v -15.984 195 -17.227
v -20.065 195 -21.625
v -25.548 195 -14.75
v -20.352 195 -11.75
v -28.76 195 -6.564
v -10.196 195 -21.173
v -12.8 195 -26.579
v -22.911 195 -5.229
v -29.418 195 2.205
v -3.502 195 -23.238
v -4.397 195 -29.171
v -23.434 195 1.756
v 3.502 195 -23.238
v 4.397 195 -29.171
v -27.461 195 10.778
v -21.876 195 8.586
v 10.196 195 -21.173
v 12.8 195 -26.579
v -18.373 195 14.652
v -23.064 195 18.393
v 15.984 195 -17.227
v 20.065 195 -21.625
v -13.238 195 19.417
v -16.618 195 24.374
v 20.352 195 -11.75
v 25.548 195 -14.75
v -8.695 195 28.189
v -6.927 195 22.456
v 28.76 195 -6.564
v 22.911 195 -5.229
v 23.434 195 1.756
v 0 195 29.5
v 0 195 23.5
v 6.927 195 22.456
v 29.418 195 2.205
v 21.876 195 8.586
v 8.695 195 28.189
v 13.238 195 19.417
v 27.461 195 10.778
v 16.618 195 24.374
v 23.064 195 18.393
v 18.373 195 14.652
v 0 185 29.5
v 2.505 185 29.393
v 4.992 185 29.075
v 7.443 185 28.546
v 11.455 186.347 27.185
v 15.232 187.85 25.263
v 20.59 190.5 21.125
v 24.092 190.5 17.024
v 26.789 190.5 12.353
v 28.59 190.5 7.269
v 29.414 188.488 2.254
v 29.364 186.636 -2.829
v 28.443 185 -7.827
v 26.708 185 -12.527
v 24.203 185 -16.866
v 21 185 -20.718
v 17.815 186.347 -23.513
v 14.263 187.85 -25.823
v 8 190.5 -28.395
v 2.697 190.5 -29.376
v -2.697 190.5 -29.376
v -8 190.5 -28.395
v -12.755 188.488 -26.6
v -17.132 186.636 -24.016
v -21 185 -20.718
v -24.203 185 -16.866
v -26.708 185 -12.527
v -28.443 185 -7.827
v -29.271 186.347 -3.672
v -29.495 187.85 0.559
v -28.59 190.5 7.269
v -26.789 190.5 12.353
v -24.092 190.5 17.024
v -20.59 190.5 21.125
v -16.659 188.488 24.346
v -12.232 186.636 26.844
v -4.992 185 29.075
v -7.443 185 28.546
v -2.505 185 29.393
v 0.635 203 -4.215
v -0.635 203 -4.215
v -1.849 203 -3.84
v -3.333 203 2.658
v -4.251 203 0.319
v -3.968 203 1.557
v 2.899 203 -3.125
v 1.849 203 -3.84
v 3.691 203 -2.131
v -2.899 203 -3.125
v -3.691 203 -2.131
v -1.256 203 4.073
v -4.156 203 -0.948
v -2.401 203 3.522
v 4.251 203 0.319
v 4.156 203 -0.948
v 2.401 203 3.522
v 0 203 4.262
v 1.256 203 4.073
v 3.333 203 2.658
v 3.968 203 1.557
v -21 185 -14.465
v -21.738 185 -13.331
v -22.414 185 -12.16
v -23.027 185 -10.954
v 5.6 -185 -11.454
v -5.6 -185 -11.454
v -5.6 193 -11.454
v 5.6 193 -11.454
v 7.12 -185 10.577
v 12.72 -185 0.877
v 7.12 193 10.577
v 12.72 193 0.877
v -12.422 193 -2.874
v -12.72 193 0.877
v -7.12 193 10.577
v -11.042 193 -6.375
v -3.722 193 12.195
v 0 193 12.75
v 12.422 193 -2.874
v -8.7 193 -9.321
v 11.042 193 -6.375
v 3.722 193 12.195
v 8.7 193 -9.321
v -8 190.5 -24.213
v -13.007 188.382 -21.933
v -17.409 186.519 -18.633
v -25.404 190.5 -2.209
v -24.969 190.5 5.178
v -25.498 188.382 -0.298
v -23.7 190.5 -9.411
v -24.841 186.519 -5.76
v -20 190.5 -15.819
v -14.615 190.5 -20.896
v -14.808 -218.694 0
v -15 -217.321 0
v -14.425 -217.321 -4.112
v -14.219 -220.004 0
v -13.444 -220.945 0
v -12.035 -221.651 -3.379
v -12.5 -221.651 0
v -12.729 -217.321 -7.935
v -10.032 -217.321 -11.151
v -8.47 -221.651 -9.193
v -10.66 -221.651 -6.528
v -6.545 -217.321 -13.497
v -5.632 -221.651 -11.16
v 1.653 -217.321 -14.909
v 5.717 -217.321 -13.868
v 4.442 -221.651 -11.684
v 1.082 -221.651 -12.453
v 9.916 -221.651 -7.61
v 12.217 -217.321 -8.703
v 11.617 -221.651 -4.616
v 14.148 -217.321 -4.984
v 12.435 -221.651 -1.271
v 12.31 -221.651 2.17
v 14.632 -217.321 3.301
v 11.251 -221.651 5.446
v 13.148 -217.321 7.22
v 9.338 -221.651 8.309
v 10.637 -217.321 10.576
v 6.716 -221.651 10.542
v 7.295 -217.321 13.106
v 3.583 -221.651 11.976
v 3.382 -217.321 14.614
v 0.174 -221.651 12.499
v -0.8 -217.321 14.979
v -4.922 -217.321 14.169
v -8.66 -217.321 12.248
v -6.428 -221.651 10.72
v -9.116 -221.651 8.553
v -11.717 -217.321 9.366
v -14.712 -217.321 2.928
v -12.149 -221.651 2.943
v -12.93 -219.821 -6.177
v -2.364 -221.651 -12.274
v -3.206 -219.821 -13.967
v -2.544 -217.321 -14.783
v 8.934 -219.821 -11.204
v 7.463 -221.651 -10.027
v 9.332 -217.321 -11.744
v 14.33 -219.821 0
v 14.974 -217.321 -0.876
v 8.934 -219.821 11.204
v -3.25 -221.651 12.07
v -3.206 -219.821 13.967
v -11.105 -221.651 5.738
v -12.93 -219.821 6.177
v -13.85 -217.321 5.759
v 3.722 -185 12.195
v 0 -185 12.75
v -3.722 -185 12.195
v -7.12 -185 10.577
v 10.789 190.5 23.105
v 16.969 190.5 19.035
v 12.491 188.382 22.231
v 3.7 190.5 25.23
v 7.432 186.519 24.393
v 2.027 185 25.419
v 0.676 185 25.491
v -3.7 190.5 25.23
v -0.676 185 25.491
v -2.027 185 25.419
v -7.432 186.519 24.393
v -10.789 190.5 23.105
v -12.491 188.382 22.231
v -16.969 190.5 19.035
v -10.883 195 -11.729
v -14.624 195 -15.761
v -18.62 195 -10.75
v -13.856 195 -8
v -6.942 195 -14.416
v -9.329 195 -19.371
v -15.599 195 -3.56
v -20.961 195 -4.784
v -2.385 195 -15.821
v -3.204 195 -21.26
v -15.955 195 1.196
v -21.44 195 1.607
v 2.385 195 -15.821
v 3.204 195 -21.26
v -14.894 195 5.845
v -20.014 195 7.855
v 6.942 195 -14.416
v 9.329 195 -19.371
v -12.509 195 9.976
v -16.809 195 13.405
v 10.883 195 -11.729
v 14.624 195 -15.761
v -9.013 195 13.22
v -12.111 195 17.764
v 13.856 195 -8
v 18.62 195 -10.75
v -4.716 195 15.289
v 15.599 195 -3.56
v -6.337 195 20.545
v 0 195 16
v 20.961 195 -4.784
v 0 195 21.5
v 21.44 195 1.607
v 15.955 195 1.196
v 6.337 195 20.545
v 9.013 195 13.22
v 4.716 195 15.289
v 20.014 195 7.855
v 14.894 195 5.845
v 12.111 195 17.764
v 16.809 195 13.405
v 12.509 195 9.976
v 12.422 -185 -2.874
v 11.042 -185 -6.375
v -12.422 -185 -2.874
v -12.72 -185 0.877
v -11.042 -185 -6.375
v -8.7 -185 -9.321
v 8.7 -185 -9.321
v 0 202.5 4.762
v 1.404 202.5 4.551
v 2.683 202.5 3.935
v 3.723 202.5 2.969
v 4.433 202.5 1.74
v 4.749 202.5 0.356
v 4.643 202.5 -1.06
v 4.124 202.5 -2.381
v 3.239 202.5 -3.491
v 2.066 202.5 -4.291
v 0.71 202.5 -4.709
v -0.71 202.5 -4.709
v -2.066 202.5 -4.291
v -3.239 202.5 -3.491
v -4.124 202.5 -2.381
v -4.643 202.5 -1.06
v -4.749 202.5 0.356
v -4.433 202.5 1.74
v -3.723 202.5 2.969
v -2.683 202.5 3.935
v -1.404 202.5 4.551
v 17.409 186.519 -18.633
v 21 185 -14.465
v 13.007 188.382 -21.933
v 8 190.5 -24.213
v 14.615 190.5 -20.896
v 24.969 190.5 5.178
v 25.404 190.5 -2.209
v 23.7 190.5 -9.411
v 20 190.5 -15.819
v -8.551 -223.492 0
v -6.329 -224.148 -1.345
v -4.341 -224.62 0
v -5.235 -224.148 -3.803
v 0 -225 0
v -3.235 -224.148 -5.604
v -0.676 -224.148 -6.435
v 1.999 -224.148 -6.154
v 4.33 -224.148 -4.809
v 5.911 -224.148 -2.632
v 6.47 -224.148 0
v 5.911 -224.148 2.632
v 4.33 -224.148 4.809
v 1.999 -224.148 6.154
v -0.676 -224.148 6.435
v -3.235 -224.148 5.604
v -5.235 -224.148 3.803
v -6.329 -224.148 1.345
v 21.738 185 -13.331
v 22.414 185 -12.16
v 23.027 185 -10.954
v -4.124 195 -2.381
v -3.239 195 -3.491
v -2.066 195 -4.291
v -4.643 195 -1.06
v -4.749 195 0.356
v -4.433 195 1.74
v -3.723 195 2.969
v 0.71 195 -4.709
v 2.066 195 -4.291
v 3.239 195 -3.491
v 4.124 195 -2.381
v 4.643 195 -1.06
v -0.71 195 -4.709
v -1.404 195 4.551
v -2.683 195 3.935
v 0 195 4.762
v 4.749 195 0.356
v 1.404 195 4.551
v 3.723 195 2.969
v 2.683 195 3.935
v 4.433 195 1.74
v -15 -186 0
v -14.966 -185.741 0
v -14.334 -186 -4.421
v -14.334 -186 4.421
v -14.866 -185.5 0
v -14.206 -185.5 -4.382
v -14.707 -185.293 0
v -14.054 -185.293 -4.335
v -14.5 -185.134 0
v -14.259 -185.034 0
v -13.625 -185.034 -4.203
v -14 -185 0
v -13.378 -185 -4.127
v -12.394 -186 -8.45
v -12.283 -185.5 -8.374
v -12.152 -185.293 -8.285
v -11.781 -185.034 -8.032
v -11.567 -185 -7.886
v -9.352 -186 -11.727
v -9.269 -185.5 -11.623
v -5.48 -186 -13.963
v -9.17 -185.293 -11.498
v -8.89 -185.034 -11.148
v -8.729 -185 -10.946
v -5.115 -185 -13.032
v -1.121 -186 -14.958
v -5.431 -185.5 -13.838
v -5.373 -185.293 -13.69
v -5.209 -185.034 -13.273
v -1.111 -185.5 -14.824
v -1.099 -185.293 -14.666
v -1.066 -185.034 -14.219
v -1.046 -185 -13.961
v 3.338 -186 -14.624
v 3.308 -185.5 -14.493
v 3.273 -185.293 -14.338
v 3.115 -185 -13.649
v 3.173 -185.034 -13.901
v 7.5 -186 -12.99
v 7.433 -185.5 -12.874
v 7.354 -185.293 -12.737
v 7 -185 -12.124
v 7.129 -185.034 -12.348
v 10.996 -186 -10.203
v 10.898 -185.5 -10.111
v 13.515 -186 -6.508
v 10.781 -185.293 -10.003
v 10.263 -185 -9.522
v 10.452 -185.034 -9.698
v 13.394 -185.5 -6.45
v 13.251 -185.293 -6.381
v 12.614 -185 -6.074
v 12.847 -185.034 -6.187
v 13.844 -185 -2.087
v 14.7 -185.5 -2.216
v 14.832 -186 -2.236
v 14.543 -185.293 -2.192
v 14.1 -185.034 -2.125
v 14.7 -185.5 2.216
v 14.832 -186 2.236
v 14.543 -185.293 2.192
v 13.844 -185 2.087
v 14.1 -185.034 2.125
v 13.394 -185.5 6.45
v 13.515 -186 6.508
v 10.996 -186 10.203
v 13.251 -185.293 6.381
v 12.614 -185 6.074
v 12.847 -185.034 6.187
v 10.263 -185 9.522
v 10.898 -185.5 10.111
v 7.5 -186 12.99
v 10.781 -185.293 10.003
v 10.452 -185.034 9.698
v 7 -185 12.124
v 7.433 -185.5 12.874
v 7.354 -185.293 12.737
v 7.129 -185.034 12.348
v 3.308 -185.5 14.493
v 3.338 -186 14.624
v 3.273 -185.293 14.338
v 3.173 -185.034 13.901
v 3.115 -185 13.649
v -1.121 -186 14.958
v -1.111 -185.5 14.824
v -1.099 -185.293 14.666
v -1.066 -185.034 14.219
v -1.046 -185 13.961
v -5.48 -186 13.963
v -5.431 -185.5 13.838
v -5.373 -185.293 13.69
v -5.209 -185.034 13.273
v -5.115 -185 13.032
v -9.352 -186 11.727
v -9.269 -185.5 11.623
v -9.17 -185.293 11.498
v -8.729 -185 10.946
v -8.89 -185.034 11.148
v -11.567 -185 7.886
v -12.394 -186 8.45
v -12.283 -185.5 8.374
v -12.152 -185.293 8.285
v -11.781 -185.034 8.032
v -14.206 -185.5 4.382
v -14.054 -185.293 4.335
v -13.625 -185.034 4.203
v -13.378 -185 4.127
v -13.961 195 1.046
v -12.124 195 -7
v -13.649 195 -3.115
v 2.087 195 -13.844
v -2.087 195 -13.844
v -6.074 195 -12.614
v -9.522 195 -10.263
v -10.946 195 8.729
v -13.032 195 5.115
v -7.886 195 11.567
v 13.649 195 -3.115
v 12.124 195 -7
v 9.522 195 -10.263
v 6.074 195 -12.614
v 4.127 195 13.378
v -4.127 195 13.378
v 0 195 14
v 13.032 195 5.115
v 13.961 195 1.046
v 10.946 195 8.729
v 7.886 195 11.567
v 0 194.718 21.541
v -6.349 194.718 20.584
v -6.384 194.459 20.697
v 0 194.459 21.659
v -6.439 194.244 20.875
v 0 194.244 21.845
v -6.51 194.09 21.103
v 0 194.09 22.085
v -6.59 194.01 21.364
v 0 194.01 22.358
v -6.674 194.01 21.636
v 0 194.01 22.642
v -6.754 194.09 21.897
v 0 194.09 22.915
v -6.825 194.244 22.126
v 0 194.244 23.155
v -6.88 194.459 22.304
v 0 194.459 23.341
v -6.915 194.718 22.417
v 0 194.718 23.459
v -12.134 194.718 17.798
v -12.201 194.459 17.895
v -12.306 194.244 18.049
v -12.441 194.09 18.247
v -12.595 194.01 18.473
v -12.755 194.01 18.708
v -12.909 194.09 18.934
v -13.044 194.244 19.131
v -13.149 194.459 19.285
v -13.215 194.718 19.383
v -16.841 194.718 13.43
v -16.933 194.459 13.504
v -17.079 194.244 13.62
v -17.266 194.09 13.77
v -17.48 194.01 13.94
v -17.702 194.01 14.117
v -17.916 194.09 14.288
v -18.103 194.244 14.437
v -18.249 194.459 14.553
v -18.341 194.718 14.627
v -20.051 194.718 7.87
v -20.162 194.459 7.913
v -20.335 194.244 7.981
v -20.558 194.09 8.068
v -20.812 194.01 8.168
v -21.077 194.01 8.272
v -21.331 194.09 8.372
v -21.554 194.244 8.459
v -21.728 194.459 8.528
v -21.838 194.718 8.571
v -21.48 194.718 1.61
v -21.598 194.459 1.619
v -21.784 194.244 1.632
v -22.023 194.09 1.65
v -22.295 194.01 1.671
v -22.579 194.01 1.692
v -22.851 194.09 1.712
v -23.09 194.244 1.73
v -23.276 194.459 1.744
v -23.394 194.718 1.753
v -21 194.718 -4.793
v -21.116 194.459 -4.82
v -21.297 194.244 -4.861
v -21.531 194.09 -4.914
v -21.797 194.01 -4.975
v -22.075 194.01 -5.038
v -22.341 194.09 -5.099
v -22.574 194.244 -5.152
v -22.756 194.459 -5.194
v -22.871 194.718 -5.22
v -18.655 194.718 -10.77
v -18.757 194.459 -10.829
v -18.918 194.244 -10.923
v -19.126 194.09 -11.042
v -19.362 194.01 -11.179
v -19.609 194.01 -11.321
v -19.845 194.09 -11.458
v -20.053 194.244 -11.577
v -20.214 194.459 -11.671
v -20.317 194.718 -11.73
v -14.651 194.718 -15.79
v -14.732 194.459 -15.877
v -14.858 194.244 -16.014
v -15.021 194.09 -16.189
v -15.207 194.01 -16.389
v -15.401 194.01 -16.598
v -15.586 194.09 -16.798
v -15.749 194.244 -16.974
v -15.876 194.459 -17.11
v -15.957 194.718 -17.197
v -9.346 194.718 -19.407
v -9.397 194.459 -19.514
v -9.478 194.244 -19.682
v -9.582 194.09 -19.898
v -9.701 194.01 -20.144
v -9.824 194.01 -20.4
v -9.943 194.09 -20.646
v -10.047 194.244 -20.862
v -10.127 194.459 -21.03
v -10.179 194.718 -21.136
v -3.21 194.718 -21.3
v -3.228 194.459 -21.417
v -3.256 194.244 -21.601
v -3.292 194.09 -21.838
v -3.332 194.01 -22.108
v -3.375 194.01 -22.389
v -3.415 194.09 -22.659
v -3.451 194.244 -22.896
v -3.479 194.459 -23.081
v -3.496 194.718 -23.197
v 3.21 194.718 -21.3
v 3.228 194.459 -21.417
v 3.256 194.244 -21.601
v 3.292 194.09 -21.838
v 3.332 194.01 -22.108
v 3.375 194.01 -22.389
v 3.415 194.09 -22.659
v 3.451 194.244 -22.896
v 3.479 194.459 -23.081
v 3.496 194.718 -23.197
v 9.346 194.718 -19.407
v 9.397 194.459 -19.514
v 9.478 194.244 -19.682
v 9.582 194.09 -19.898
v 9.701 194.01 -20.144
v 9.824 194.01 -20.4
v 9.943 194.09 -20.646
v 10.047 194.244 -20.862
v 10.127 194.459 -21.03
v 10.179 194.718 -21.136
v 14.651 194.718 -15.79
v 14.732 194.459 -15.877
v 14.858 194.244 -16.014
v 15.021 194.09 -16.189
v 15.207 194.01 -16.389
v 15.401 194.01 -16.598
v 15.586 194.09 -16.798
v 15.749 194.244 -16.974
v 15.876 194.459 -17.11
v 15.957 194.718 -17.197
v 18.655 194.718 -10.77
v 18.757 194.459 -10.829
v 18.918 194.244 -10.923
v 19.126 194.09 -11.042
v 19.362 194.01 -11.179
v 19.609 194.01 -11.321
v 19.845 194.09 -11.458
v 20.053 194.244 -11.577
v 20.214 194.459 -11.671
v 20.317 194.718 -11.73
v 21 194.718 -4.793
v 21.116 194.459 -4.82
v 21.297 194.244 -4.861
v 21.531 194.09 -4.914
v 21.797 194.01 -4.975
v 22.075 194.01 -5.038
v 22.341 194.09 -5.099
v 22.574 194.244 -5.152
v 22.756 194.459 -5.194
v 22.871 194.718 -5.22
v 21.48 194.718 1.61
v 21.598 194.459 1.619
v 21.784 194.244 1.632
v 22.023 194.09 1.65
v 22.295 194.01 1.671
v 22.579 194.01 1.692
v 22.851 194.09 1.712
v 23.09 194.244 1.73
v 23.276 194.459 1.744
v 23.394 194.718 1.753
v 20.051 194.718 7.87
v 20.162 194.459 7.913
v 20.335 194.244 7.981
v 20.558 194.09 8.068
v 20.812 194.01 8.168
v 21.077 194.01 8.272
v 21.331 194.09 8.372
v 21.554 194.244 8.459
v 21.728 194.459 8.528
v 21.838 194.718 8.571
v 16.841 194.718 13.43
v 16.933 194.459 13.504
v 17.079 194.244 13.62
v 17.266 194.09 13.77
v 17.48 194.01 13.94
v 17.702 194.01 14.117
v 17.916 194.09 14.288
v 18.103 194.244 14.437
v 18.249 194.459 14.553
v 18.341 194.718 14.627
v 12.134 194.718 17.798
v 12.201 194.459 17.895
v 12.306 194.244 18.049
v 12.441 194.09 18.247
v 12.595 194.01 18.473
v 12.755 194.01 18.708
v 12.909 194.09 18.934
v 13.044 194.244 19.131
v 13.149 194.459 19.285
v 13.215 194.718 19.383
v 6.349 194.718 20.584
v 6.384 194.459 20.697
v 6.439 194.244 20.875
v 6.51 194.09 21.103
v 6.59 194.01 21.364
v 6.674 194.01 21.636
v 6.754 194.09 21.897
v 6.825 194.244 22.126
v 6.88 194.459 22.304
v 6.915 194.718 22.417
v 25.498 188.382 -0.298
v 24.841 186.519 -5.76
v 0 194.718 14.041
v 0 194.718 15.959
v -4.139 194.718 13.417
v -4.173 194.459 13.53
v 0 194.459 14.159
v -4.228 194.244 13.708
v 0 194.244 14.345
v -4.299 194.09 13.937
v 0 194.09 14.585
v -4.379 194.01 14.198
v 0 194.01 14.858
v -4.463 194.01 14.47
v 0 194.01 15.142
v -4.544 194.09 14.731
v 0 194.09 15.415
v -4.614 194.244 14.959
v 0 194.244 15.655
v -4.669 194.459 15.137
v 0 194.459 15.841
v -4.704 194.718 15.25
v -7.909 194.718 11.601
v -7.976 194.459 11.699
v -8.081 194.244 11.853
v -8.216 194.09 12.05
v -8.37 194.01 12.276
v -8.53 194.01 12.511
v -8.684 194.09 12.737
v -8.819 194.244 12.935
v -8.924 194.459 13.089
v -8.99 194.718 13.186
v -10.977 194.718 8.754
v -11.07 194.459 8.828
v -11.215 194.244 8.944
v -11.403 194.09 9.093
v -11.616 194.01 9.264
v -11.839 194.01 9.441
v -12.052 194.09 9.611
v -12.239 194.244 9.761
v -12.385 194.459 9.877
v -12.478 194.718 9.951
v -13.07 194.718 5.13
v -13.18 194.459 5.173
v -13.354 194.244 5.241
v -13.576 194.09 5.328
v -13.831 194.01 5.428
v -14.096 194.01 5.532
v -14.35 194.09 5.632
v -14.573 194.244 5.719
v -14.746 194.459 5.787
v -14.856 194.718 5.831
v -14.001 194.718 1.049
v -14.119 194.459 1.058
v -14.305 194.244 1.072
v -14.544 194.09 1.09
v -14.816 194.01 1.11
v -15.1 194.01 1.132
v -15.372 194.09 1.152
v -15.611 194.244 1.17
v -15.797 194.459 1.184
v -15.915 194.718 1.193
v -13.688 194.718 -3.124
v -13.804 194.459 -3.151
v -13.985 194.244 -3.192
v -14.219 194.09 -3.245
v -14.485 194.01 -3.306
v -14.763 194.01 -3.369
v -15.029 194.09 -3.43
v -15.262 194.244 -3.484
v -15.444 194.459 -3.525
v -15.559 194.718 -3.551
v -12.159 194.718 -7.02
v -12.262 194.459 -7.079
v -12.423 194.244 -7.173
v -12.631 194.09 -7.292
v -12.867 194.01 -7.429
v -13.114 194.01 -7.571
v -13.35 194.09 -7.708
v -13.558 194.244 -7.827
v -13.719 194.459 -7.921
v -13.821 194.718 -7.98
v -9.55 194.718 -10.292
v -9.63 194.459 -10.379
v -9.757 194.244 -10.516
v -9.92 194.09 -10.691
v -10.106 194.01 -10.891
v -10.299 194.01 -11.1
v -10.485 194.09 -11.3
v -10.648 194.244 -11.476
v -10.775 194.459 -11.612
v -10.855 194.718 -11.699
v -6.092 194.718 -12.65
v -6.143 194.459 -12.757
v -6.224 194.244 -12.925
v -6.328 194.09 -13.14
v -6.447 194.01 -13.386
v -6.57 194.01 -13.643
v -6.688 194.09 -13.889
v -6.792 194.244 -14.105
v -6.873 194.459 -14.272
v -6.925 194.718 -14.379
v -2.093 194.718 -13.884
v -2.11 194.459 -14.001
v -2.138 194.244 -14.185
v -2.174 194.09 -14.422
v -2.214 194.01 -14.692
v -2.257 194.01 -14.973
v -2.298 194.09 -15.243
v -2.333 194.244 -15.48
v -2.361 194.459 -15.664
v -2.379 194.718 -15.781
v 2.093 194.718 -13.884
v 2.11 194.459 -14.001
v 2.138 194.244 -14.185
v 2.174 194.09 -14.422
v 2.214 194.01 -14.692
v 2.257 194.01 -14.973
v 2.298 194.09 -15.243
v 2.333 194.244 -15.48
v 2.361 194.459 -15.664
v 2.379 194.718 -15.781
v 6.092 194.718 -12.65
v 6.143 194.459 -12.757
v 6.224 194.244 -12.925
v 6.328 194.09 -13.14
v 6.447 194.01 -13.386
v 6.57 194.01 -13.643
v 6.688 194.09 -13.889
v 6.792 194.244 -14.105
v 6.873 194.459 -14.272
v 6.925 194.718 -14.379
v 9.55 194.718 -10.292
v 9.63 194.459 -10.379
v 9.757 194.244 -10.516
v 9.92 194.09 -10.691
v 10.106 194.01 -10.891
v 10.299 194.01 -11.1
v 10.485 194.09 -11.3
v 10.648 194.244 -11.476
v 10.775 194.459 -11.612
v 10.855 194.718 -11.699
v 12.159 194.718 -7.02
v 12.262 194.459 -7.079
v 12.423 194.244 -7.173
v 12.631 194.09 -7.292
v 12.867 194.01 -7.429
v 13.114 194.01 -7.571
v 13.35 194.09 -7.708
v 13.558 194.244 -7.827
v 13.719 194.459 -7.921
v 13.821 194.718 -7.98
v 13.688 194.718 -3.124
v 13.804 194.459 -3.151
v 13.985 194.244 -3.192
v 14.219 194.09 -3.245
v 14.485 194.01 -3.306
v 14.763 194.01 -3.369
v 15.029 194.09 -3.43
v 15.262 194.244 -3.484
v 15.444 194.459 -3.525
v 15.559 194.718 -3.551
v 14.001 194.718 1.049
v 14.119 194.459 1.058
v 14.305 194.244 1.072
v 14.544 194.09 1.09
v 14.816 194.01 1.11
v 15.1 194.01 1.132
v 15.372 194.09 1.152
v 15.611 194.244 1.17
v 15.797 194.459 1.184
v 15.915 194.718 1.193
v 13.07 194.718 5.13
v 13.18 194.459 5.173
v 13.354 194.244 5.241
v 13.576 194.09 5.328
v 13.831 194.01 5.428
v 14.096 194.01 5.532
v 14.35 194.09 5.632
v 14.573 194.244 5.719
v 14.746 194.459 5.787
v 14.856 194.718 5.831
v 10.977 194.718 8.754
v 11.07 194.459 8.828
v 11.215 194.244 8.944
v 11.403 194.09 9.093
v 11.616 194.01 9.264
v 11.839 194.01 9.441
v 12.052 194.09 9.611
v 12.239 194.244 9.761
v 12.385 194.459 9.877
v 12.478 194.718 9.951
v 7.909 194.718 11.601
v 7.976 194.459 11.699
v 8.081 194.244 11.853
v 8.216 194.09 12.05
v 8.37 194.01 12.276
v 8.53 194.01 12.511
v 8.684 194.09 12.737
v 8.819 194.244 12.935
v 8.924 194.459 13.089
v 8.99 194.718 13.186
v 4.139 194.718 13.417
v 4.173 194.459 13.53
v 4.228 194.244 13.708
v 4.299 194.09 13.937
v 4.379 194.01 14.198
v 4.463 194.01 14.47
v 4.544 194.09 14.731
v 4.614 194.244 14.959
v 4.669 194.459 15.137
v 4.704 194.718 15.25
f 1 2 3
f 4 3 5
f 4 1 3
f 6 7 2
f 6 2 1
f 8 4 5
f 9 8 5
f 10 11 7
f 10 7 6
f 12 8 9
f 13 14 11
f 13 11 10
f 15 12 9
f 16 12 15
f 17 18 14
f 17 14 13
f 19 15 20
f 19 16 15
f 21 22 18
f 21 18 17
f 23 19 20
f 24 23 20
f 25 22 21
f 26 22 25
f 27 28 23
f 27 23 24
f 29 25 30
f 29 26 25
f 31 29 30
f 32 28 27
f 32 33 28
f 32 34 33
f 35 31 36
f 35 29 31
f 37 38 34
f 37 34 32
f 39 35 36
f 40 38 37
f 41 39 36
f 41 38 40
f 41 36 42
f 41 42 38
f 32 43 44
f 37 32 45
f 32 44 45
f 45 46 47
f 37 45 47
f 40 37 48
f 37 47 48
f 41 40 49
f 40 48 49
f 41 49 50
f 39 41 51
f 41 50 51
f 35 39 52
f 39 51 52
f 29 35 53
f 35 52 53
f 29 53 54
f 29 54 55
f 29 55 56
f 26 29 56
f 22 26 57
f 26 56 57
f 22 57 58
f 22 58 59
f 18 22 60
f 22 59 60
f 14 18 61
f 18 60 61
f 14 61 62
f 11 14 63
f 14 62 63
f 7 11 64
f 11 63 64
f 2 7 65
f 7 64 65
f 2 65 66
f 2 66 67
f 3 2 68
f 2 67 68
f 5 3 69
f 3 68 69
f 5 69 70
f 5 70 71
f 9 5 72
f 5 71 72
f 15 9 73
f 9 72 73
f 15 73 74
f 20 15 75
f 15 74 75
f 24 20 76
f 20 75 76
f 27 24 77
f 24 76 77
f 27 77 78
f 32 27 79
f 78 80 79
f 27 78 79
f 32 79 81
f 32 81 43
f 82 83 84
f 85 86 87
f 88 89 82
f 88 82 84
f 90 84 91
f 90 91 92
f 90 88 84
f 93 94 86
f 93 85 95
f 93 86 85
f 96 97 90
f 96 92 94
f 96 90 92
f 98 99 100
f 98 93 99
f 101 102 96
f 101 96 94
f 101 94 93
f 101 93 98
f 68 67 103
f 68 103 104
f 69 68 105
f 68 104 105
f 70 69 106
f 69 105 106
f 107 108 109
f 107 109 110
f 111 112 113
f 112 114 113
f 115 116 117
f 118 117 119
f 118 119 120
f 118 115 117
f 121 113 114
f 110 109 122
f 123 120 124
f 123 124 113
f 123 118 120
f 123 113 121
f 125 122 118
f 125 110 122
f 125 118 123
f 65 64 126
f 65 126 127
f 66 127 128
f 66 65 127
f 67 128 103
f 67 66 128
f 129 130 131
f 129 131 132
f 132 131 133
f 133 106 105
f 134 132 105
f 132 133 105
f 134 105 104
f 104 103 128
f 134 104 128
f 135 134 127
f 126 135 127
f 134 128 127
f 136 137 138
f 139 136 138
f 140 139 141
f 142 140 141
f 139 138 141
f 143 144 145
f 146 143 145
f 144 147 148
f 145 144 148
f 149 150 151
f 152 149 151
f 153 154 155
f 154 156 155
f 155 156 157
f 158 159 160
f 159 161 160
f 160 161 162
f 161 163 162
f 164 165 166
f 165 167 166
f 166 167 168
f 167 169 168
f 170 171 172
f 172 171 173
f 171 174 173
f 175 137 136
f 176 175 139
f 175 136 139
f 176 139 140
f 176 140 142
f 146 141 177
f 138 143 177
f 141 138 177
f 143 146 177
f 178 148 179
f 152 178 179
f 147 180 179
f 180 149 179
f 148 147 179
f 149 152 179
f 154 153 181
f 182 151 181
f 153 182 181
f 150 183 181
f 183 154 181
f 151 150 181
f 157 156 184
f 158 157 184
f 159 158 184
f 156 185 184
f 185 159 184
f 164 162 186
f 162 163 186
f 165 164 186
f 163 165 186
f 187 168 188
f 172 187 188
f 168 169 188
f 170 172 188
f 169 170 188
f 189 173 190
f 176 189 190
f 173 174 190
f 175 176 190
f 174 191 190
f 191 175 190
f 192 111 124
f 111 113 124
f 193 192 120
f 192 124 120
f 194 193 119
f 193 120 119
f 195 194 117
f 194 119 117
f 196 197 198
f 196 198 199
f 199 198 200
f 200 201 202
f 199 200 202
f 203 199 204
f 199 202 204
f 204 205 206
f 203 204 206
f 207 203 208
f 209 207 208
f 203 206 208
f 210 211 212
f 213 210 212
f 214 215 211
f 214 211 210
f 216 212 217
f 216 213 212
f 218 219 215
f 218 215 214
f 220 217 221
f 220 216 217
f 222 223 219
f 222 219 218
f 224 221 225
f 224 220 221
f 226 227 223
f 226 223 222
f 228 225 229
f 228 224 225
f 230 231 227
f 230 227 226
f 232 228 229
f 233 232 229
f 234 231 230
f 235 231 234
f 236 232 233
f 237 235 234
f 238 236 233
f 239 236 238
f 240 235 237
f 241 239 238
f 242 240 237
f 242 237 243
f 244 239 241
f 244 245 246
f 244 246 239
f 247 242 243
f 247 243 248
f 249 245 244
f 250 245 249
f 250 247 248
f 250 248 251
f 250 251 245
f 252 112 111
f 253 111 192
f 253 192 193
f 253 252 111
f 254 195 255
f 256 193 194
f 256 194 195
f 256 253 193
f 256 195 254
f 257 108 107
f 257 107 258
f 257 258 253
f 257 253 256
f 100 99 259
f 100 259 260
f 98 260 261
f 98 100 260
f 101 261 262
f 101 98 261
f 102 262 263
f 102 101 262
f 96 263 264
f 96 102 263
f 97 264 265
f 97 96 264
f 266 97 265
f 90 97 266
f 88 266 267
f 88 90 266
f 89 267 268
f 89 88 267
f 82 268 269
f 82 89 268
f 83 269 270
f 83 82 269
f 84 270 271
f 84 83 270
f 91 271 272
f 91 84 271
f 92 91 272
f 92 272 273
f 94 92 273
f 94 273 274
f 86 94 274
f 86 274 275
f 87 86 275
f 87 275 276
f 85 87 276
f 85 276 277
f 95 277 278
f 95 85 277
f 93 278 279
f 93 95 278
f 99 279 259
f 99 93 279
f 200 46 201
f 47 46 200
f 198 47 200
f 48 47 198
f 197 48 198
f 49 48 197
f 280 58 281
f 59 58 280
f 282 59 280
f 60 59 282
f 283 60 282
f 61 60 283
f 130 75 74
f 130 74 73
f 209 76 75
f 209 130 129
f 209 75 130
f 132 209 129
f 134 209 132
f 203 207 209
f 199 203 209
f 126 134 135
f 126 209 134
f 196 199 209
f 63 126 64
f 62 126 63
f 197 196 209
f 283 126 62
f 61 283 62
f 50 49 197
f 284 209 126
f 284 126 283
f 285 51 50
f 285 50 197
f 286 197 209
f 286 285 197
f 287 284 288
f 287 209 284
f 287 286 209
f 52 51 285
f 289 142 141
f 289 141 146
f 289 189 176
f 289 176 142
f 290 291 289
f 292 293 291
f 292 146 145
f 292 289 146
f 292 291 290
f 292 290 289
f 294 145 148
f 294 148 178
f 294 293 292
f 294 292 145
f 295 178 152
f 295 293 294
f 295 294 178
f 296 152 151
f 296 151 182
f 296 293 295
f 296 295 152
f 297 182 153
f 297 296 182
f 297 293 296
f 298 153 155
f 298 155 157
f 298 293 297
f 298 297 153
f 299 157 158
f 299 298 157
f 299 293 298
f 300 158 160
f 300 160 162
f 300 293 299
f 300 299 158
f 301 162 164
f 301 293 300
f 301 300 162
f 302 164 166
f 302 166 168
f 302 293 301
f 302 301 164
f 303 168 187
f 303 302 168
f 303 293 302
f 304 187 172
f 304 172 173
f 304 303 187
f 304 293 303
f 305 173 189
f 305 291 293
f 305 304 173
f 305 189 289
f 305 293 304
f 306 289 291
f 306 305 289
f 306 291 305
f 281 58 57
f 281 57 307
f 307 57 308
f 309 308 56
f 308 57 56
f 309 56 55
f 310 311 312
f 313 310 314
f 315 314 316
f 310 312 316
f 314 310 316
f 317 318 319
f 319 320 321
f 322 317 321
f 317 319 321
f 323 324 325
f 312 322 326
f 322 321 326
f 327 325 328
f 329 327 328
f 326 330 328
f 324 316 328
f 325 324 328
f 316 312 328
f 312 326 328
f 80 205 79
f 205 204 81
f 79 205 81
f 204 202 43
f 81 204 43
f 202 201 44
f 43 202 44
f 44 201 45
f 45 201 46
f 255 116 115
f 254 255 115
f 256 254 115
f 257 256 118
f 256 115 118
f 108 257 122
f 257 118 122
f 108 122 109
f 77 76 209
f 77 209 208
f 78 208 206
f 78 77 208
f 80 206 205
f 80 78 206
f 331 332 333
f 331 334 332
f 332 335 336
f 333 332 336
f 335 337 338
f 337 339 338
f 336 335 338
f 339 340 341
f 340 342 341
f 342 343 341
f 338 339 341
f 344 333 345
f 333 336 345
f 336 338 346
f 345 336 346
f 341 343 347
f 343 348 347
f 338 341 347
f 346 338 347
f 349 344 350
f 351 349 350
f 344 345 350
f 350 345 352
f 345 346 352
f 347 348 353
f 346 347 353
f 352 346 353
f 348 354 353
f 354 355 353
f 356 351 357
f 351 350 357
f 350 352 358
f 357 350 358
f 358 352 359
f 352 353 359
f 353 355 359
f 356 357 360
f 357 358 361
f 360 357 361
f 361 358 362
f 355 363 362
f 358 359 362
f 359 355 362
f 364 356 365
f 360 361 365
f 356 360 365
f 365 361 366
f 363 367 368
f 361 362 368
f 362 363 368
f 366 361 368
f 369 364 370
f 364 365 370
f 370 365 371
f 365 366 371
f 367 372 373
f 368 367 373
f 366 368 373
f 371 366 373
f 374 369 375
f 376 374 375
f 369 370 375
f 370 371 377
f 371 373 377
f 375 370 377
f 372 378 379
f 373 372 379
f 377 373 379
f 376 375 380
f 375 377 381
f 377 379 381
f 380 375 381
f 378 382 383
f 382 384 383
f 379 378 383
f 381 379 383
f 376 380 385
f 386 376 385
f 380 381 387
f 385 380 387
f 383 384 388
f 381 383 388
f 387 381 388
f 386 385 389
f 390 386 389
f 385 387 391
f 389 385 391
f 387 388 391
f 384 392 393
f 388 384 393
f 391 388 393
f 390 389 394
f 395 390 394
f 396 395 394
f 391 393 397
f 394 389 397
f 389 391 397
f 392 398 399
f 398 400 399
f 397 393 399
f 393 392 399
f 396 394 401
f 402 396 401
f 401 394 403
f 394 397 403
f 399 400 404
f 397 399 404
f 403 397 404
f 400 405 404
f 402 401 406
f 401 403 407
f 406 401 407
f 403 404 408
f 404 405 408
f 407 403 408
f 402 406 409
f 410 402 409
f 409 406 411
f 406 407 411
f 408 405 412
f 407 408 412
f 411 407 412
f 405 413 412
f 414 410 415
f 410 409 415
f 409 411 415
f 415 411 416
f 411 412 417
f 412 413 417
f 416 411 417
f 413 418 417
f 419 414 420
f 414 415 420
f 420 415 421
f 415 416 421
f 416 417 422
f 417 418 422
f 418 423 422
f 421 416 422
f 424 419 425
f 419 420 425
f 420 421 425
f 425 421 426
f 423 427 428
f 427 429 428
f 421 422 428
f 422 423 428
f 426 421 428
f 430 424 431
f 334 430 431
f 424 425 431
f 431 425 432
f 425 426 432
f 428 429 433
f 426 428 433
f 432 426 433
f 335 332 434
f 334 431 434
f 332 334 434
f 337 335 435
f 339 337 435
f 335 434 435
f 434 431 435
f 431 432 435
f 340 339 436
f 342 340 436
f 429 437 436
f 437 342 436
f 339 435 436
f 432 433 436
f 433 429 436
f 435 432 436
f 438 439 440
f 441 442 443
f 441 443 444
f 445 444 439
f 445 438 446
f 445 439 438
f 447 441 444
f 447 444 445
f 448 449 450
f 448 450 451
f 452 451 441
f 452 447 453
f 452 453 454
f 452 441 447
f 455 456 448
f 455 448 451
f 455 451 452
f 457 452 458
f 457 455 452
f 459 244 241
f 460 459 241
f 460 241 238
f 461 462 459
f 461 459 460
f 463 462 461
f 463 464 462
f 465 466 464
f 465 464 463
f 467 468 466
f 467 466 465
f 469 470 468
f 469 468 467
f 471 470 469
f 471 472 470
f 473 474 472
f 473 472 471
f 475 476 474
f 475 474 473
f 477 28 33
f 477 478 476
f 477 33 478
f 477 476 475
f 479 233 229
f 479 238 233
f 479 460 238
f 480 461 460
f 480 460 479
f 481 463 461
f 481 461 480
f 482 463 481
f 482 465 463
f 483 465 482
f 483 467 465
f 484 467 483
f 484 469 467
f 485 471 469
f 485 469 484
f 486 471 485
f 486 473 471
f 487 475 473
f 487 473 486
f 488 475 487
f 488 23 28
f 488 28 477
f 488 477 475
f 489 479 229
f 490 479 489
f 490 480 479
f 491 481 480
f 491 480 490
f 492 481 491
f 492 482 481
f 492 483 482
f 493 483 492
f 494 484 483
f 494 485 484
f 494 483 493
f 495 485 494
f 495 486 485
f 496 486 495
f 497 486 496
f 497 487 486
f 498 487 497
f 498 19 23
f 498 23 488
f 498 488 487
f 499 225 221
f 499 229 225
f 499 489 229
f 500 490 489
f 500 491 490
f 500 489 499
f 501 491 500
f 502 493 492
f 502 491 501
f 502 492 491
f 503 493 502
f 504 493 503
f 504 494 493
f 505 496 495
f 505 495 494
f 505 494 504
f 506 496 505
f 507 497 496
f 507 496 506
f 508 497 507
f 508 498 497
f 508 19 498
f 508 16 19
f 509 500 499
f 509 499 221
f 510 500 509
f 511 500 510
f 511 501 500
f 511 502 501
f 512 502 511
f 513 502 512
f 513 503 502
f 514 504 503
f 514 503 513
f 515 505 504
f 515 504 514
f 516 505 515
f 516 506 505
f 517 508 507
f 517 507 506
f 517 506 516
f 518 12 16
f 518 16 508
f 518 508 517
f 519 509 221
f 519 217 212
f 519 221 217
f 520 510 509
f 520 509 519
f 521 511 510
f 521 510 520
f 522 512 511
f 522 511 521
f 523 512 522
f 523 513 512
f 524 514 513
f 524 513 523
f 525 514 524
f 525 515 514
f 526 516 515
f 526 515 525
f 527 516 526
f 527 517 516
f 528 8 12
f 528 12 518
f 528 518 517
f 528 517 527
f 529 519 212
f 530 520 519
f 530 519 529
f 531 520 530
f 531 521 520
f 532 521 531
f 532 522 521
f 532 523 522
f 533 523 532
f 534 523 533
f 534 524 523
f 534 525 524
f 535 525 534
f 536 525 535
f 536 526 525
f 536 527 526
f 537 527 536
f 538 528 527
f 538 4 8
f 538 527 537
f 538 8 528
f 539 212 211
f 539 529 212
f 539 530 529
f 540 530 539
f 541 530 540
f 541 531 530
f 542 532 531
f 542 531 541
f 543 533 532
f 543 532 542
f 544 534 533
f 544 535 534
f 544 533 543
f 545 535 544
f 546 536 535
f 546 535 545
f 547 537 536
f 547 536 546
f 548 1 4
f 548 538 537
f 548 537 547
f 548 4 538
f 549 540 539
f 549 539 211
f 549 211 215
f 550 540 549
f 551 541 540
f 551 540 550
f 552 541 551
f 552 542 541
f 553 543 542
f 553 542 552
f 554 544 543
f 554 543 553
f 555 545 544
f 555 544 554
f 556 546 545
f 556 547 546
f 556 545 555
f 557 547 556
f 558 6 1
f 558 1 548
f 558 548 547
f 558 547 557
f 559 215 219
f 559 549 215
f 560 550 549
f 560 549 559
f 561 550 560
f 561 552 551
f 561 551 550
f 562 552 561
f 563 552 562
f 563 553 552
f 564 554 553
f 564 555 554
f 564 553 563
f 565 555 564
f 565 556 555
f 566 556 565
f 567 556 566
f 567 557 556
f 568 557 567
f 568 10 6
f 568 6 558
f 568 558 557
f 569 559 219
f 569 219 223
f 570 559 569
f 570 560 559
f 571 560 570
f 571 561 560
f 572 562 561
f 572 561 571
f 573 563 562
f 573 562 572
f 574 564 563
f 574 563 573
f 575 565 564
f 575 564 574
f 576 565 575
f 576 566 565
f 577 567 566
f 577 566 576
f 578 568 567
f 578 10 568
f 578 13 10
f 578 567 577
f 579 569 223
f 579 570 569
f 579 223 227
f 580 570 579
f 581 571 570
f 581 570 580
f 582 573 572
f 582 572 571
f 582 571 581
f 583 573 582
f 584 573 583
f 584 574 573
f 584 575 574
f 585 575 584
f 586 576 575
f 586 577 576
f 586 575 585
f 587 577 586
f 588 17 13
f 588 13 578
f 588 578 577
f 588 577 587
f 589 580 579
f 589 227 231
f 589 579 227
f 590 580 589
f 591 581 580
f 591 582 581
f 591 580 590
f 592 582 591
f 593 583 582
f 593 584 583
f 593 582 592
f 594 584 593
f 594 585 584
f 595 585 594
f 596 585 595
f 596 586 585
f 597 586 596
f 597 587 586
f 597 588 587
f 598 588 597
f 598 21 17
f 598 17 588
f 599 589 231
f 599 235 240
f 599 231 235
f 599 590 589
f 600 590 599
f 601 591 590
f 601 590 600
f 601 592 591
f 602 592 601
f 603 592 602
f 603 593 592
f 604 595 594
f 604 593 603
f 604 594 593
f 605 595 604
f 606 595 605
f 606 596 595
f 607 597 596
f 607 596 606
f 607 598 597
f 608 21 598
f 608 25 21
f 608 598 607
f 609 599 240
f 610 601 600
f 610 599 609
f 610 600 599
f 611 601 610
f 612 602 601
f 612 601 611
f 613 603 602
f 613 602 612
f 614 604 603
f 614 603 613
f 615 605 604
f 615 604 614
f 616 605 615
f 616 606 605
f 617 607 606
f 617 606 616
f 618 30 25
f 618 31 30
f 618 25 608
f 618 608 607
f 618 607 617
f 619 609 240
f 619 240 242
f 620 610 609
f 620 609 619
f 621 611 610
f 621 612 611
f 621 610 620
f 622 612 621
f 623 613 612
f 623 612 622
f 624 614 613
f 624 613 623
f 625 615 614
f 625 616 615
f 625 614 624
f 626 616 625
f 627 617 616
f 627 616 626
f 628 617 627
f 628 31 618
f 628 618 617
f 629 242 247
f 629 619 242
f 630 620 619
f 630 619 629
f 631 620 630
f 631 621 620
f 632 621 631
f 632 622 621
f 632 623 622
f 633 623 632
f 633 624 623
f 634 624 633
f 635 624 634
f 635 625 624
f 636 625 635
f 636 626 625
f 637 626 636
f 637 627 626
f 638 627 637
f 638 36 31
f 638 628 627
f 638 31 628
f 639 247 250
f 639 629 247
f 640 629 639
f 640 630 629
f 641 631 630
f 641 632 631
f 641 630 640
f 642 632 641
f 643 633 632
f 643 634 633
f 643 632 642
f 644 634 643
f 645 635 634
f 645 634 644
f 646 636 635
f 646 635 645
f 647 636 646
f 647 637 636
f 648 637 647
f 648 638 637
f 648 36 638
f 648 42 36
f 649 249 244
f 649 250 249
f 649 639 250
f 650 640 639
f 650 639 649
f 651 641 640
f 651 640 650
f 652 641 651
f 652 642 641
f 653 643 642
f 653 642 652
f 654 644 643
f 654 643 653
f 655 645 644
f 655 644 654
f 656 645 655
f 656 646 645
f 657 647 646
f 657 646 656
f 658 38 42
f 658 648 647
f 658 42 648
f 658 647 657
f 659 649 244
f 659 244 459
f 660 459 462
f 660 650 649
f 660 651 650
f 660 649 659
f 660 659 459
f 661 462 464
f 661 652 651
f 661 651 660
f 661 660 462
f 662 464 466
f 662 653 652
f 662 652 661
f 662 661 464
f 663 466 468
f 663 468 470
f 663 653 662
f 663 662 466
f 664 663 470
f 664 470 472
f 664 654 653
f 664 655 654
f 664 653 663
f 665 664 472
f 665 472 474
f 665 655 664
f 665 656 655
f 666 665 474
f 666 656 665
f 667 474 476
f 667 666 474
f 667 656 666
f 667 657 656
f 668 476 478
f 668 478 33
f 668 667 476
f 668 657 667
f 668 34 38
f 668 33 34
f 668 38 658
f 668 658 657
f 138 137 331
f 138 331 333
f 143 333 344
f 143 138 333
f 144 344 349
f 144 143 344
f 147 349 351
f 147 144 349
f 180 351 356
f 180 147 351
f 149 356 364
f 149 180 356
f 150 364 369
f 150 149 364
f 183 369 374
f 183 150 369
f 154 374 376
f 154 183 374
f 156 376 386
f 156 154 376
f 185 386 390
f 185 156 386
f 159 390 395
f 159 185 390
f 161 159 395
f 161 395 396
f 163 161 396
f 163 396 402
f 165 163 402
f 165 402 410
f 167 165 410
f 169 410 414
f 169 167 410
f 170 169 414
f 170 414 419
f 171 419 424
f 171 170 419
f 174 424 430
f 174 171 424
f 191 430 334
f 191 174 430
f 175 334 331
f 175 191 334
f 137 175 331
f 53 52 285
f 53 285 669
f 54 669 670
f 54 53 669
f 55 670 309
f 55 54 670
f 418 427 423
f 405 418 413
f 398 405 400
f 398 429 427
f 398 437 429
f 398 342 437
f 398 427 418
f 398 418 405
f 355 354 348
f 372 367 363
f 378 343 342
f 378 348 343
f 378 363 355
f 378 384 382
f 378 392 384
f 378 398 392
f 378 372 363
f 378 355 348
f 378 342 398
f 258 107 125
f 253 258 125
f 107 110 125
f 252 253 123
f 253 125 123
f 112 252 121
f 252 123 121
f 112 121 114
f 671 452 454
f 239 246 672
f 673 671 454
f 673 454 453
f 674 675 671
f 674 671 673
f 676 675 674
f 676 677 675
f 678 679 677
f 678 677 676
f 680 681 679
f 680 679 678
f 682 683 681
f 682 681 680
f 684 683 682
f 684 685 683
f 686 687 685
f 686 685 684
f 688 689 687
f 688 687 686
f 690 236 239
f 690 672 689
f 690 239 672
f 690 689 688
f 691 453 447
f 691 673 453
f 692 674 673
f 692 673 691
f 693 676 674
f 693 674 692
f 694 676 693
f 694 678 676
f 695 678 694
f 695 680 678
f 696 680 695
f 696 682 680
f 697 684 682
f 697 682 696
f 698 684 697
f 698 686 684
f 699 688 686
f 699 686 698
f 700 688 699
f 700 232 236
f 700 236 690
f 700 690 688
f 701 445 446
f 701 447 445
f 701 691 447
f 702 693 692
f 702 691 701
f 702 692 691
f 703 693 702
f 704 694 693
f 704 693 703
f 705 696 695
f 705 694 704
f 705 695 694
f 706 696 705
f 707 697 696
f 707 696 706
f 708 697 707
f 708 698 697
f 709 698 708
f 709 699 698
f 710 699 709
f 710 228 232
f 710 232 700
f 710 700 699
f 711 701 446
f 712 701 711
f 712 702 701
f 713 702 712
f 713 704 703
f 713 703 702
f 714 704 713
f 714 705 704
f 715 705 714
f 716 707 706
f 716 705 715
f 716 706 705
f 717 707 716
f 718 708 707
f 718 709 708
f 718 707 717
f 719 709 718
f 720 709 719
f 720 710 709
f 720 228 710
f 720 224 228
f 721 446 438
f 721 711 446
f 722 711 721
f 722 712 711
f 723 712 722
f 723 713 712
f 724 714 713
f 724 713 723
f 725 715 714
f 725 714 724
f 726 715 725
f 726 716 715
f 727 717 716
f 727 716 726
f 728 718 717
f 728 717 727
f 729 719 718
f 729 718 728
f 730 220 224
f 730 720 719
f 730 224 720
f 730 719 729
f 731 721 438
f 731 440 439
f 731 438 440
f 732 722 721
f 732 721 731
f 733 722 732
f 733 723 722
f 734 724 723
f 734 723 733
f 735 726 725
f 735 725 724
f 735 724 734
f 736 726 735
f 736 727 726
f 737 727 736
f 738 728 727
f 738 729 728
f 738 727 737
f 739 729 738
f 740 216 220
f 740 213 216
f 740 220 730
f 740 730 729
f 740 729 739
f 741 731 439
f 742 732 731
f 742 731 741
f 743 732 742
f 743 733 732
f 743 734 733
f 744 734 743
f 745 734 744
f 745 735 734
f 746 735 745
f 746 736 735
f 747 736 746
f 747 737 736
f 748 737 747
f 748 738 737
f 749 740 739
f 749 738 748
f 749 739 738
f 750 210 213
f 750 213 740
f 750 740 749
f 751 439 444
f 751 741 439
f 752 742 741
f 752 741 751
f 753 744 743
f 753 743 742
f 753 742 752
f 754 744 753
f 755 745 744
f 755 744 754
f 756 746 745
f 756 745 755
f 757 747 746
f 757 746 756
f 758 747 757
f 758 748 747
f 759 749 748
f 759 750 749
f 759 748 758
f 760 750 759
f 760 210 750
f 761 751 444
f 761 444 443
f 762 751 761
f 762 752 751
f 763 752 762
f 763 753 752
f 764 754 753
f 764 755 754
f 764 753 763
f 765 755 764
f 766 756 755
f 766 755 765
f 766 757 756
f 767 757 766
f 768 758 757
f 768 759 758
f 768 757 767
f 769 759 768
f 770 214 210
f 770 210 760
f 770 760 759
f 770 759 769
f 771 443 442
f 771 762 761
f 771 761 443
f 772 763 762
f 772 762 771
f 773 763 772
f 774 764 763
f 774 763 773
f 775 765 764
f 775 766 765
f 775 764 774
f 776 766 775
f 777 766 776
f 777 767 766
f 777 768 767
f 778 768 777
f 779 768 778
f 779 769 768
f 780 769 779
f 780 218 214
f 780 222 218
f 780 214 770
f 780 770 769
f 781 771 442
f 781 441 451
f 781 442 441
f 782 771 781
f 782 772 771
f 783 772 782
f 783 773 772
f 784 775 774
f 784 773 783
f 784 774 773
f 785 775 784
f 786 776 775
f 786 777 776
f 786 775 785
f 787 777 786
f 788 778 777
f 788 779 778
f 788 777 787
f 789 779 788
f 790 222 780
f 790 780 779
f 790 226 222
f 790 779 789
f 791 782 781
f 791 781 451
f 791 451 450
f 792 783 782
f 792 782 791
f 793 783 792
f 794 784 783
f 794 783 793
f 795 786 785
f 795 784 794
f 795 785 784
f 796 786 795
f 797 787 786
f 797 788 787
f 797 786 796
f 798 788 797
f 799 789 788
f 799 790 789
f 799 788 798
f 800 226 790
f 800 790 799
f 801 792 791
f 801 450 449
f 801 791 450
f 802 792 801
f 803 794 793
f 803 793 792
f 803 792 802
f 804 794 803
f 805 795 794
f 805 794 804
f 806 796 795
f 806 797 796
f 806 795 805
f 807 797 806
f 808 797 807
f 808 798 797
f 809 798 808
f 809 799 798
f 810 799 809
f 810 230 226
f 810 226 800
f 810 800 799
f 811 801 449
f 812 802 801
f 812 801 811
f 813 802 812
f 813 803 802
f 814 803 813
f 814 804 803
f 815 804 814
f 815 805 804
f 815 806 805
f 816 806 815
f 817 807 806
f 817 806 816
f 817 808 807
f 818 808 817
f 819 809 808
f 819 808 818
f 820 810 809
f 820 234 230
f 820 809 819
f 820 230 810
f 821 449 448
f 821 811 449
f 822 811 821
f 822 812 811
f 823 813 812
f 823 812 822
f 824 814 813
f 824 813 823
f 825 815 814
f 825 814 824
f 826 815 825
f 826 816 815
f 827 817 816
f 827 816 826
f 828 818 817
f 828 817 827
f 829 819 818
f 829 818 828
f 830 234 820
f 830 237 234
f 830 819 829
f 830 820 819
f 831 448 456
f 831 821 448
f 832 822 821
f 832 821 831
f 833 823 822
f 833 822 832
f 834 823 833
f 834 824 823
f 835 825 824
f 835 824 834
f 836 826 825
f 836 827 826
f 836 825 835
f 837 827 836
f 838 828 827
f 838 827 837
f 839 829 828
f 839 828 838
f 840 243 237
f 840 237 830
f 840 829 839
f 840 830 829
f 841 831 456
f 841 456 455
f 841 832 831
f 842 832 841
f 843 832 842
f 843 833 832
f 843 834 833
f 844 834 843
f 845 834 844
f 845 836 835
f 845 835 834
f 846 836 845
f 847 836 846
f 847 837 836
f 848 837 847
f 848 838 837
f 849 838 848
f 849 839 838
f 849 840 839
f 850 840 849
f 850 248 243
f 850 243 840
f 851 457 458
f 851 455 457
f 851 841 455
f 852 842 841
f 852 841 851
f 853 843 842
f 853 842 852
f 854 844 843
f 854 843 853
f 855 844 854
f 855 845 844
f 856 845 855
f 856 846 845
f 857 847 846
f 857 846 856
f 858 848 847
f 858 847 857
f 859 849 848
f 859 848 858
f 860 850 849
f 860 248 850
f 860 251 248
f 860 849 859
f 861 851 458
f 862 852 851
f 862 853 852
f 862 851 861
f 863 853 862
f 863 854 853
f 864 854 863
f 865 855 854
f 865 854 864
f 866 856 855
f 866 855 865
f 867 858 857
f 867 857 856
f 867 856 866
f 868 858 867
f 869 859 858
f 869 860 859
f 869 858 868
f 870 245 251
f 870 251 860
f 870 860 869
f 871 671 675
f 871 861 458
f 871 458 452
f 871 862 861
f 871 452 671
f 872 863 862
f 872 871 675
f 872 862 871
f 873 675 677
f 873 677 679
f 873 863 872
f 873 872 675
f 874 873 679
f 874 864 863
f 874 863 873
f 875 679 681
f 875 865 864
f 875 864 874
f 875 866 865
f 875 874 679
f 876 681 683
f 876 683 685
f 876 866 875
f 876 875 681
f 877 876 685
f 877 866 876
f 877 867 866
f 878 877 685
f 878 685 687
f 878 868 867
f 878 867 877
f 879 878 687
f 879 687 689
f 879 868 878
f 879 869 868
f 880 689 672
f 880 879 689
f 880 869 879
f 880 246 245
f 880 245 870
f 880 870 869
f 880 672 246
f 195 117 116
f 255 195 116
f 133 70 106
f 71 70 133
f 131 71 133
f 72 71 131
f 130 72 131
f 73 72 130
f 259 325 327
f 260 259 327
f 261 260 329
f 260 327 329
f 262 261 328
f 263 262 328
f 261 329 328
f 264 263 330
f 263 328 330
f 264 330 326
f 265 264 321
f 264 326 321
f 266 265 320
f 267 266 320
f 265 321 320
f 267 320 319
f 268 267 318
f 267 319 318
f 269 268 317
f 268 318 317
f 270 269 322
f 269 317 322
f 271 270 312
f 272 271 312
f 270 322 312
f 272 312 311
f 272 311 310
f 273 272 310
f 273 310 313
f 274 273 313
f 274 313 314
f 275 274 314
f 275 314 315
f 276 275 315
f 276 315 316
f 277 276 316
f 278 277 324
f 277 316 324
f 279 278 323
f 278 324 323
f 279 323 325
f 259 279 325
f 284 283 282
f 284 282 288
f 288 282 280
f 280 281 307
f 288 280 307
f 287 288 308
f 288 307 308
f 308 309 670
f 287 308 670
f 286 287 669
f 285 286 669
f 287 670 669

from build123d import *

# Parameters (mm, degrees)
EXTRUDE1_DEPTH      = 185
SKETCH3_R           = 29.5
EXTRUDE2_DEPTH      = 10
SKETCH7_R           = 1
SKETCH6_OUTSIDE_W   = 138.81
SKETCH6_OUTSIDE_H   = 138.81
SKETCH6_OUTSIDE_R   = 29.5
SKETCH6_OUTSIDE_R_2 = 25.5
EXTRUDE4_DEPTH      = 5.5
EXTRUDE3_DEPTH      = 23
CIRPATTERN1_COUNT   = 3
SKETCH8_R           = 4.7625
EXTRUDE5_DEPTH      = 8
CHAMFER1_SIZE       = 0.5
EXTRUDE6_DEPTH      = 8
FILLET1_R           = 5
FILLET2_R           = 1


with BuildPart() as part:
    # Sketch2 → Extrude1 (new, symmetric)
    with BuildSketch(Plane(origin=(0, 0, 0), x_dir=(1, 0, 0), z_dir=(0, 1, 0))):
        with BuildLine():
            Line((-5.6, 11.45436598), (5.6, 11.45436598))
            ThreePointArc((5.6, 11.45436598), (11.041823898, 6.375), (12.719771923, -0.877440729))
            Line((12.719771923, -0.877440729), (7.119771923, -10.576925251))
            ThreePointArc((7.119771923, -10.576925251), (0, -12.75), (-7.119771923, -10.576925251))
            Line((-7.119771923, -10.576925251), (-12.719771923, -0.877440729))
            ThreePointArc((-12.719771923, -0.877440729), (-11.041823898, 6.375), (-5.6, 11.45436598))
        make_face()
    extrude(amount=EXTRUDE1_DEPTH, both=True)


with BuildPart() as body_2:
    # Sketch3 → Extrude2 (new body)
    with BuildSketch(Plane(origin=(0, 185, 0), x_dir=(1, 0, 0), z_dir=(0, 1, 0))):
        with Locations(Location((0, 0, 0), (0, 0, 270))):
            Circle(SKETCH3_R)
    extrude(amount=EXTRUDE2_DEPTH)

    # Sketch7 → Cut-Revolve1 (revolve, cut)
    with BuildSketch(Plane.XY, mode=Mode.PRIVATE) as cut_revolve1_sk:
        with Locations((15, 195)):
            Circle(SKETCH7_R)
        with Locations((22.5, 195)):
            Circle(SKETCH7_R)
    revolve(cut_revolve1_sk.sketch.rotate(Axis((0, 203.822792645, 0), (0, -1, 0)), 90), axis=Axis((0, 203.822792645, 0), (0, -1, 0)), mode=Mode.SUBTRACT)

    # Sketch6 outside → Extrude4 (cut)
    # profile 1 of 2: a face of its own
    with BuildSketch(Plane.XZ.offset(-185)):
        Rectangle(SKETCH6_OUTSIDE_W, SKETCH6_OUTSIDE_H)
        with Locations(Location((0, 0, 0), (0, 0, 90))):
            Circle(SKETCH6_OUTSIDE_R, mode=Mode.SUBTRACT)
    # profile 2 of 2: a face of its own
    with BuildSketch(Plane.XZ.offset(-185)):
        with Locations(Location((0, 0, 0), (0, 0, 270))):
            Circle(SKETCH6_OUTSIDE_R_2)
    extrude(amount=-EXTRUDE4_DEPTH, mode=Mode.SUBTRACT)

    # Sketch4 → Extrude3 (cut)
    with BuildSketch(Plane.XY.offset(-35)):
        Polygon((8, 190.5), (-8, 190.5), (-21, 185), (21, 185), align=None)
    extrude3 = extrude(amount=EXTRUDE3_DEPTH, mode=Mode.SUBTRACT)

    # CirPattern1: Extrude3 ×3 about axis
    cirpattern1_axis = Axis((0, 0, 0), (0, 1, 0))
    for i in range(1, CIRPATTERN1_COUNT):
        add(extrude3.rotate(cirpattern1_axis, i * 360 / CIRPATTERN1_COUNT), mode=Mode.SUBTRACT)


with BuildPart() as body_3:
    # Sketch8 → Extrude5 (new body)
    with BuildSketch(Plane(origin=(0, 195, 0), x_dir=(1, 0, 0), z_dir=(0, 1, 0))):
        with Locations(Location((0, 0, 0), (0, 0, 270))):
            Circle(SKETCH8_R)
    extrude(amount=EXTRUDE5_DEPTH)

    # Chamfer1
    chamfer1_edges = [body_3.edges().sort_by_distance(p)[0] for p in [
        (0, 203, -4.7625),
    ]]
    chamfer(chamfer1_edges, length=CHAMFER1_SIZE)


with BuildPart() as body_4:
    # Sketch9 → Extrude6 (new body)
    with BuildSketch(Plane(origin=(0, 185, 0), x_dir=(1, 0, 0), z_dir=(0, 1, 0))):
        with BuildLine():
            Line((-12.719771923, -0.877440729), (-7.119771923, -10.576925251))
            ThreePointArc((-7.119771923, -10.576925251), (0, -12.75), (7.119771923, -10.576925251))
            Line((7.119771923, -10.576925251), (12.719771923, -0.877440729))
            ThreePointArc((12.719771923, -0.877440729), (11.041823898, 6.375), (5.6, 11.45436598))
            Line((5.6, 11.45436598), (-5.6, 11.45436598))
            ThreePointArc((-5.6, 11.45436598), (-11.041823898, 6.375), (-12.719771923, -0.877440729))
        make_face()
    extrude(amount=EXTRUDE6_DEPTH)

    # Combine1: union part
    add(part.part)


with BuildPart() as body_5:
    # Sketch10 → Revolve1 (revolve)
    with BuildSketch(Plane.XY, mode=Mode.PRIVATE) as revolve1_sk:
        with BuildLine():
            Line((15, -185), (15, -220))
            ThreePointArc((15, -220), (7.90569415, -223.717082451), (0, -225))
            Line((0, -225), (0, -185))
            Line((0, -185), (15, -185))
        make_face()
    revolve(revolve1_sk.sketch.rotate(Axis((0, -185, 0), (0, -1, 0)), 180), axis=Axis((0, -185, 0), (0, -1, 0)))

    # Fillet1
    fillet1_edges = [body_5.edges().sort_by_distance(p)[0] for p in [
        (15, -220, 0),
    ]]
    fillet(fillet1_edges, radius=FILLET1_R)

    # Fillet2
    fillet2_edges = [body_5.edges().sort_by_distance(p)[0] for p in [
        (15, -185, 0),
    ]]
    fillet(fillet2_edges, radius=FILLET2_R)


solid = Compound([body_2.part, body_3.part, body_4.part, body_5.part])
